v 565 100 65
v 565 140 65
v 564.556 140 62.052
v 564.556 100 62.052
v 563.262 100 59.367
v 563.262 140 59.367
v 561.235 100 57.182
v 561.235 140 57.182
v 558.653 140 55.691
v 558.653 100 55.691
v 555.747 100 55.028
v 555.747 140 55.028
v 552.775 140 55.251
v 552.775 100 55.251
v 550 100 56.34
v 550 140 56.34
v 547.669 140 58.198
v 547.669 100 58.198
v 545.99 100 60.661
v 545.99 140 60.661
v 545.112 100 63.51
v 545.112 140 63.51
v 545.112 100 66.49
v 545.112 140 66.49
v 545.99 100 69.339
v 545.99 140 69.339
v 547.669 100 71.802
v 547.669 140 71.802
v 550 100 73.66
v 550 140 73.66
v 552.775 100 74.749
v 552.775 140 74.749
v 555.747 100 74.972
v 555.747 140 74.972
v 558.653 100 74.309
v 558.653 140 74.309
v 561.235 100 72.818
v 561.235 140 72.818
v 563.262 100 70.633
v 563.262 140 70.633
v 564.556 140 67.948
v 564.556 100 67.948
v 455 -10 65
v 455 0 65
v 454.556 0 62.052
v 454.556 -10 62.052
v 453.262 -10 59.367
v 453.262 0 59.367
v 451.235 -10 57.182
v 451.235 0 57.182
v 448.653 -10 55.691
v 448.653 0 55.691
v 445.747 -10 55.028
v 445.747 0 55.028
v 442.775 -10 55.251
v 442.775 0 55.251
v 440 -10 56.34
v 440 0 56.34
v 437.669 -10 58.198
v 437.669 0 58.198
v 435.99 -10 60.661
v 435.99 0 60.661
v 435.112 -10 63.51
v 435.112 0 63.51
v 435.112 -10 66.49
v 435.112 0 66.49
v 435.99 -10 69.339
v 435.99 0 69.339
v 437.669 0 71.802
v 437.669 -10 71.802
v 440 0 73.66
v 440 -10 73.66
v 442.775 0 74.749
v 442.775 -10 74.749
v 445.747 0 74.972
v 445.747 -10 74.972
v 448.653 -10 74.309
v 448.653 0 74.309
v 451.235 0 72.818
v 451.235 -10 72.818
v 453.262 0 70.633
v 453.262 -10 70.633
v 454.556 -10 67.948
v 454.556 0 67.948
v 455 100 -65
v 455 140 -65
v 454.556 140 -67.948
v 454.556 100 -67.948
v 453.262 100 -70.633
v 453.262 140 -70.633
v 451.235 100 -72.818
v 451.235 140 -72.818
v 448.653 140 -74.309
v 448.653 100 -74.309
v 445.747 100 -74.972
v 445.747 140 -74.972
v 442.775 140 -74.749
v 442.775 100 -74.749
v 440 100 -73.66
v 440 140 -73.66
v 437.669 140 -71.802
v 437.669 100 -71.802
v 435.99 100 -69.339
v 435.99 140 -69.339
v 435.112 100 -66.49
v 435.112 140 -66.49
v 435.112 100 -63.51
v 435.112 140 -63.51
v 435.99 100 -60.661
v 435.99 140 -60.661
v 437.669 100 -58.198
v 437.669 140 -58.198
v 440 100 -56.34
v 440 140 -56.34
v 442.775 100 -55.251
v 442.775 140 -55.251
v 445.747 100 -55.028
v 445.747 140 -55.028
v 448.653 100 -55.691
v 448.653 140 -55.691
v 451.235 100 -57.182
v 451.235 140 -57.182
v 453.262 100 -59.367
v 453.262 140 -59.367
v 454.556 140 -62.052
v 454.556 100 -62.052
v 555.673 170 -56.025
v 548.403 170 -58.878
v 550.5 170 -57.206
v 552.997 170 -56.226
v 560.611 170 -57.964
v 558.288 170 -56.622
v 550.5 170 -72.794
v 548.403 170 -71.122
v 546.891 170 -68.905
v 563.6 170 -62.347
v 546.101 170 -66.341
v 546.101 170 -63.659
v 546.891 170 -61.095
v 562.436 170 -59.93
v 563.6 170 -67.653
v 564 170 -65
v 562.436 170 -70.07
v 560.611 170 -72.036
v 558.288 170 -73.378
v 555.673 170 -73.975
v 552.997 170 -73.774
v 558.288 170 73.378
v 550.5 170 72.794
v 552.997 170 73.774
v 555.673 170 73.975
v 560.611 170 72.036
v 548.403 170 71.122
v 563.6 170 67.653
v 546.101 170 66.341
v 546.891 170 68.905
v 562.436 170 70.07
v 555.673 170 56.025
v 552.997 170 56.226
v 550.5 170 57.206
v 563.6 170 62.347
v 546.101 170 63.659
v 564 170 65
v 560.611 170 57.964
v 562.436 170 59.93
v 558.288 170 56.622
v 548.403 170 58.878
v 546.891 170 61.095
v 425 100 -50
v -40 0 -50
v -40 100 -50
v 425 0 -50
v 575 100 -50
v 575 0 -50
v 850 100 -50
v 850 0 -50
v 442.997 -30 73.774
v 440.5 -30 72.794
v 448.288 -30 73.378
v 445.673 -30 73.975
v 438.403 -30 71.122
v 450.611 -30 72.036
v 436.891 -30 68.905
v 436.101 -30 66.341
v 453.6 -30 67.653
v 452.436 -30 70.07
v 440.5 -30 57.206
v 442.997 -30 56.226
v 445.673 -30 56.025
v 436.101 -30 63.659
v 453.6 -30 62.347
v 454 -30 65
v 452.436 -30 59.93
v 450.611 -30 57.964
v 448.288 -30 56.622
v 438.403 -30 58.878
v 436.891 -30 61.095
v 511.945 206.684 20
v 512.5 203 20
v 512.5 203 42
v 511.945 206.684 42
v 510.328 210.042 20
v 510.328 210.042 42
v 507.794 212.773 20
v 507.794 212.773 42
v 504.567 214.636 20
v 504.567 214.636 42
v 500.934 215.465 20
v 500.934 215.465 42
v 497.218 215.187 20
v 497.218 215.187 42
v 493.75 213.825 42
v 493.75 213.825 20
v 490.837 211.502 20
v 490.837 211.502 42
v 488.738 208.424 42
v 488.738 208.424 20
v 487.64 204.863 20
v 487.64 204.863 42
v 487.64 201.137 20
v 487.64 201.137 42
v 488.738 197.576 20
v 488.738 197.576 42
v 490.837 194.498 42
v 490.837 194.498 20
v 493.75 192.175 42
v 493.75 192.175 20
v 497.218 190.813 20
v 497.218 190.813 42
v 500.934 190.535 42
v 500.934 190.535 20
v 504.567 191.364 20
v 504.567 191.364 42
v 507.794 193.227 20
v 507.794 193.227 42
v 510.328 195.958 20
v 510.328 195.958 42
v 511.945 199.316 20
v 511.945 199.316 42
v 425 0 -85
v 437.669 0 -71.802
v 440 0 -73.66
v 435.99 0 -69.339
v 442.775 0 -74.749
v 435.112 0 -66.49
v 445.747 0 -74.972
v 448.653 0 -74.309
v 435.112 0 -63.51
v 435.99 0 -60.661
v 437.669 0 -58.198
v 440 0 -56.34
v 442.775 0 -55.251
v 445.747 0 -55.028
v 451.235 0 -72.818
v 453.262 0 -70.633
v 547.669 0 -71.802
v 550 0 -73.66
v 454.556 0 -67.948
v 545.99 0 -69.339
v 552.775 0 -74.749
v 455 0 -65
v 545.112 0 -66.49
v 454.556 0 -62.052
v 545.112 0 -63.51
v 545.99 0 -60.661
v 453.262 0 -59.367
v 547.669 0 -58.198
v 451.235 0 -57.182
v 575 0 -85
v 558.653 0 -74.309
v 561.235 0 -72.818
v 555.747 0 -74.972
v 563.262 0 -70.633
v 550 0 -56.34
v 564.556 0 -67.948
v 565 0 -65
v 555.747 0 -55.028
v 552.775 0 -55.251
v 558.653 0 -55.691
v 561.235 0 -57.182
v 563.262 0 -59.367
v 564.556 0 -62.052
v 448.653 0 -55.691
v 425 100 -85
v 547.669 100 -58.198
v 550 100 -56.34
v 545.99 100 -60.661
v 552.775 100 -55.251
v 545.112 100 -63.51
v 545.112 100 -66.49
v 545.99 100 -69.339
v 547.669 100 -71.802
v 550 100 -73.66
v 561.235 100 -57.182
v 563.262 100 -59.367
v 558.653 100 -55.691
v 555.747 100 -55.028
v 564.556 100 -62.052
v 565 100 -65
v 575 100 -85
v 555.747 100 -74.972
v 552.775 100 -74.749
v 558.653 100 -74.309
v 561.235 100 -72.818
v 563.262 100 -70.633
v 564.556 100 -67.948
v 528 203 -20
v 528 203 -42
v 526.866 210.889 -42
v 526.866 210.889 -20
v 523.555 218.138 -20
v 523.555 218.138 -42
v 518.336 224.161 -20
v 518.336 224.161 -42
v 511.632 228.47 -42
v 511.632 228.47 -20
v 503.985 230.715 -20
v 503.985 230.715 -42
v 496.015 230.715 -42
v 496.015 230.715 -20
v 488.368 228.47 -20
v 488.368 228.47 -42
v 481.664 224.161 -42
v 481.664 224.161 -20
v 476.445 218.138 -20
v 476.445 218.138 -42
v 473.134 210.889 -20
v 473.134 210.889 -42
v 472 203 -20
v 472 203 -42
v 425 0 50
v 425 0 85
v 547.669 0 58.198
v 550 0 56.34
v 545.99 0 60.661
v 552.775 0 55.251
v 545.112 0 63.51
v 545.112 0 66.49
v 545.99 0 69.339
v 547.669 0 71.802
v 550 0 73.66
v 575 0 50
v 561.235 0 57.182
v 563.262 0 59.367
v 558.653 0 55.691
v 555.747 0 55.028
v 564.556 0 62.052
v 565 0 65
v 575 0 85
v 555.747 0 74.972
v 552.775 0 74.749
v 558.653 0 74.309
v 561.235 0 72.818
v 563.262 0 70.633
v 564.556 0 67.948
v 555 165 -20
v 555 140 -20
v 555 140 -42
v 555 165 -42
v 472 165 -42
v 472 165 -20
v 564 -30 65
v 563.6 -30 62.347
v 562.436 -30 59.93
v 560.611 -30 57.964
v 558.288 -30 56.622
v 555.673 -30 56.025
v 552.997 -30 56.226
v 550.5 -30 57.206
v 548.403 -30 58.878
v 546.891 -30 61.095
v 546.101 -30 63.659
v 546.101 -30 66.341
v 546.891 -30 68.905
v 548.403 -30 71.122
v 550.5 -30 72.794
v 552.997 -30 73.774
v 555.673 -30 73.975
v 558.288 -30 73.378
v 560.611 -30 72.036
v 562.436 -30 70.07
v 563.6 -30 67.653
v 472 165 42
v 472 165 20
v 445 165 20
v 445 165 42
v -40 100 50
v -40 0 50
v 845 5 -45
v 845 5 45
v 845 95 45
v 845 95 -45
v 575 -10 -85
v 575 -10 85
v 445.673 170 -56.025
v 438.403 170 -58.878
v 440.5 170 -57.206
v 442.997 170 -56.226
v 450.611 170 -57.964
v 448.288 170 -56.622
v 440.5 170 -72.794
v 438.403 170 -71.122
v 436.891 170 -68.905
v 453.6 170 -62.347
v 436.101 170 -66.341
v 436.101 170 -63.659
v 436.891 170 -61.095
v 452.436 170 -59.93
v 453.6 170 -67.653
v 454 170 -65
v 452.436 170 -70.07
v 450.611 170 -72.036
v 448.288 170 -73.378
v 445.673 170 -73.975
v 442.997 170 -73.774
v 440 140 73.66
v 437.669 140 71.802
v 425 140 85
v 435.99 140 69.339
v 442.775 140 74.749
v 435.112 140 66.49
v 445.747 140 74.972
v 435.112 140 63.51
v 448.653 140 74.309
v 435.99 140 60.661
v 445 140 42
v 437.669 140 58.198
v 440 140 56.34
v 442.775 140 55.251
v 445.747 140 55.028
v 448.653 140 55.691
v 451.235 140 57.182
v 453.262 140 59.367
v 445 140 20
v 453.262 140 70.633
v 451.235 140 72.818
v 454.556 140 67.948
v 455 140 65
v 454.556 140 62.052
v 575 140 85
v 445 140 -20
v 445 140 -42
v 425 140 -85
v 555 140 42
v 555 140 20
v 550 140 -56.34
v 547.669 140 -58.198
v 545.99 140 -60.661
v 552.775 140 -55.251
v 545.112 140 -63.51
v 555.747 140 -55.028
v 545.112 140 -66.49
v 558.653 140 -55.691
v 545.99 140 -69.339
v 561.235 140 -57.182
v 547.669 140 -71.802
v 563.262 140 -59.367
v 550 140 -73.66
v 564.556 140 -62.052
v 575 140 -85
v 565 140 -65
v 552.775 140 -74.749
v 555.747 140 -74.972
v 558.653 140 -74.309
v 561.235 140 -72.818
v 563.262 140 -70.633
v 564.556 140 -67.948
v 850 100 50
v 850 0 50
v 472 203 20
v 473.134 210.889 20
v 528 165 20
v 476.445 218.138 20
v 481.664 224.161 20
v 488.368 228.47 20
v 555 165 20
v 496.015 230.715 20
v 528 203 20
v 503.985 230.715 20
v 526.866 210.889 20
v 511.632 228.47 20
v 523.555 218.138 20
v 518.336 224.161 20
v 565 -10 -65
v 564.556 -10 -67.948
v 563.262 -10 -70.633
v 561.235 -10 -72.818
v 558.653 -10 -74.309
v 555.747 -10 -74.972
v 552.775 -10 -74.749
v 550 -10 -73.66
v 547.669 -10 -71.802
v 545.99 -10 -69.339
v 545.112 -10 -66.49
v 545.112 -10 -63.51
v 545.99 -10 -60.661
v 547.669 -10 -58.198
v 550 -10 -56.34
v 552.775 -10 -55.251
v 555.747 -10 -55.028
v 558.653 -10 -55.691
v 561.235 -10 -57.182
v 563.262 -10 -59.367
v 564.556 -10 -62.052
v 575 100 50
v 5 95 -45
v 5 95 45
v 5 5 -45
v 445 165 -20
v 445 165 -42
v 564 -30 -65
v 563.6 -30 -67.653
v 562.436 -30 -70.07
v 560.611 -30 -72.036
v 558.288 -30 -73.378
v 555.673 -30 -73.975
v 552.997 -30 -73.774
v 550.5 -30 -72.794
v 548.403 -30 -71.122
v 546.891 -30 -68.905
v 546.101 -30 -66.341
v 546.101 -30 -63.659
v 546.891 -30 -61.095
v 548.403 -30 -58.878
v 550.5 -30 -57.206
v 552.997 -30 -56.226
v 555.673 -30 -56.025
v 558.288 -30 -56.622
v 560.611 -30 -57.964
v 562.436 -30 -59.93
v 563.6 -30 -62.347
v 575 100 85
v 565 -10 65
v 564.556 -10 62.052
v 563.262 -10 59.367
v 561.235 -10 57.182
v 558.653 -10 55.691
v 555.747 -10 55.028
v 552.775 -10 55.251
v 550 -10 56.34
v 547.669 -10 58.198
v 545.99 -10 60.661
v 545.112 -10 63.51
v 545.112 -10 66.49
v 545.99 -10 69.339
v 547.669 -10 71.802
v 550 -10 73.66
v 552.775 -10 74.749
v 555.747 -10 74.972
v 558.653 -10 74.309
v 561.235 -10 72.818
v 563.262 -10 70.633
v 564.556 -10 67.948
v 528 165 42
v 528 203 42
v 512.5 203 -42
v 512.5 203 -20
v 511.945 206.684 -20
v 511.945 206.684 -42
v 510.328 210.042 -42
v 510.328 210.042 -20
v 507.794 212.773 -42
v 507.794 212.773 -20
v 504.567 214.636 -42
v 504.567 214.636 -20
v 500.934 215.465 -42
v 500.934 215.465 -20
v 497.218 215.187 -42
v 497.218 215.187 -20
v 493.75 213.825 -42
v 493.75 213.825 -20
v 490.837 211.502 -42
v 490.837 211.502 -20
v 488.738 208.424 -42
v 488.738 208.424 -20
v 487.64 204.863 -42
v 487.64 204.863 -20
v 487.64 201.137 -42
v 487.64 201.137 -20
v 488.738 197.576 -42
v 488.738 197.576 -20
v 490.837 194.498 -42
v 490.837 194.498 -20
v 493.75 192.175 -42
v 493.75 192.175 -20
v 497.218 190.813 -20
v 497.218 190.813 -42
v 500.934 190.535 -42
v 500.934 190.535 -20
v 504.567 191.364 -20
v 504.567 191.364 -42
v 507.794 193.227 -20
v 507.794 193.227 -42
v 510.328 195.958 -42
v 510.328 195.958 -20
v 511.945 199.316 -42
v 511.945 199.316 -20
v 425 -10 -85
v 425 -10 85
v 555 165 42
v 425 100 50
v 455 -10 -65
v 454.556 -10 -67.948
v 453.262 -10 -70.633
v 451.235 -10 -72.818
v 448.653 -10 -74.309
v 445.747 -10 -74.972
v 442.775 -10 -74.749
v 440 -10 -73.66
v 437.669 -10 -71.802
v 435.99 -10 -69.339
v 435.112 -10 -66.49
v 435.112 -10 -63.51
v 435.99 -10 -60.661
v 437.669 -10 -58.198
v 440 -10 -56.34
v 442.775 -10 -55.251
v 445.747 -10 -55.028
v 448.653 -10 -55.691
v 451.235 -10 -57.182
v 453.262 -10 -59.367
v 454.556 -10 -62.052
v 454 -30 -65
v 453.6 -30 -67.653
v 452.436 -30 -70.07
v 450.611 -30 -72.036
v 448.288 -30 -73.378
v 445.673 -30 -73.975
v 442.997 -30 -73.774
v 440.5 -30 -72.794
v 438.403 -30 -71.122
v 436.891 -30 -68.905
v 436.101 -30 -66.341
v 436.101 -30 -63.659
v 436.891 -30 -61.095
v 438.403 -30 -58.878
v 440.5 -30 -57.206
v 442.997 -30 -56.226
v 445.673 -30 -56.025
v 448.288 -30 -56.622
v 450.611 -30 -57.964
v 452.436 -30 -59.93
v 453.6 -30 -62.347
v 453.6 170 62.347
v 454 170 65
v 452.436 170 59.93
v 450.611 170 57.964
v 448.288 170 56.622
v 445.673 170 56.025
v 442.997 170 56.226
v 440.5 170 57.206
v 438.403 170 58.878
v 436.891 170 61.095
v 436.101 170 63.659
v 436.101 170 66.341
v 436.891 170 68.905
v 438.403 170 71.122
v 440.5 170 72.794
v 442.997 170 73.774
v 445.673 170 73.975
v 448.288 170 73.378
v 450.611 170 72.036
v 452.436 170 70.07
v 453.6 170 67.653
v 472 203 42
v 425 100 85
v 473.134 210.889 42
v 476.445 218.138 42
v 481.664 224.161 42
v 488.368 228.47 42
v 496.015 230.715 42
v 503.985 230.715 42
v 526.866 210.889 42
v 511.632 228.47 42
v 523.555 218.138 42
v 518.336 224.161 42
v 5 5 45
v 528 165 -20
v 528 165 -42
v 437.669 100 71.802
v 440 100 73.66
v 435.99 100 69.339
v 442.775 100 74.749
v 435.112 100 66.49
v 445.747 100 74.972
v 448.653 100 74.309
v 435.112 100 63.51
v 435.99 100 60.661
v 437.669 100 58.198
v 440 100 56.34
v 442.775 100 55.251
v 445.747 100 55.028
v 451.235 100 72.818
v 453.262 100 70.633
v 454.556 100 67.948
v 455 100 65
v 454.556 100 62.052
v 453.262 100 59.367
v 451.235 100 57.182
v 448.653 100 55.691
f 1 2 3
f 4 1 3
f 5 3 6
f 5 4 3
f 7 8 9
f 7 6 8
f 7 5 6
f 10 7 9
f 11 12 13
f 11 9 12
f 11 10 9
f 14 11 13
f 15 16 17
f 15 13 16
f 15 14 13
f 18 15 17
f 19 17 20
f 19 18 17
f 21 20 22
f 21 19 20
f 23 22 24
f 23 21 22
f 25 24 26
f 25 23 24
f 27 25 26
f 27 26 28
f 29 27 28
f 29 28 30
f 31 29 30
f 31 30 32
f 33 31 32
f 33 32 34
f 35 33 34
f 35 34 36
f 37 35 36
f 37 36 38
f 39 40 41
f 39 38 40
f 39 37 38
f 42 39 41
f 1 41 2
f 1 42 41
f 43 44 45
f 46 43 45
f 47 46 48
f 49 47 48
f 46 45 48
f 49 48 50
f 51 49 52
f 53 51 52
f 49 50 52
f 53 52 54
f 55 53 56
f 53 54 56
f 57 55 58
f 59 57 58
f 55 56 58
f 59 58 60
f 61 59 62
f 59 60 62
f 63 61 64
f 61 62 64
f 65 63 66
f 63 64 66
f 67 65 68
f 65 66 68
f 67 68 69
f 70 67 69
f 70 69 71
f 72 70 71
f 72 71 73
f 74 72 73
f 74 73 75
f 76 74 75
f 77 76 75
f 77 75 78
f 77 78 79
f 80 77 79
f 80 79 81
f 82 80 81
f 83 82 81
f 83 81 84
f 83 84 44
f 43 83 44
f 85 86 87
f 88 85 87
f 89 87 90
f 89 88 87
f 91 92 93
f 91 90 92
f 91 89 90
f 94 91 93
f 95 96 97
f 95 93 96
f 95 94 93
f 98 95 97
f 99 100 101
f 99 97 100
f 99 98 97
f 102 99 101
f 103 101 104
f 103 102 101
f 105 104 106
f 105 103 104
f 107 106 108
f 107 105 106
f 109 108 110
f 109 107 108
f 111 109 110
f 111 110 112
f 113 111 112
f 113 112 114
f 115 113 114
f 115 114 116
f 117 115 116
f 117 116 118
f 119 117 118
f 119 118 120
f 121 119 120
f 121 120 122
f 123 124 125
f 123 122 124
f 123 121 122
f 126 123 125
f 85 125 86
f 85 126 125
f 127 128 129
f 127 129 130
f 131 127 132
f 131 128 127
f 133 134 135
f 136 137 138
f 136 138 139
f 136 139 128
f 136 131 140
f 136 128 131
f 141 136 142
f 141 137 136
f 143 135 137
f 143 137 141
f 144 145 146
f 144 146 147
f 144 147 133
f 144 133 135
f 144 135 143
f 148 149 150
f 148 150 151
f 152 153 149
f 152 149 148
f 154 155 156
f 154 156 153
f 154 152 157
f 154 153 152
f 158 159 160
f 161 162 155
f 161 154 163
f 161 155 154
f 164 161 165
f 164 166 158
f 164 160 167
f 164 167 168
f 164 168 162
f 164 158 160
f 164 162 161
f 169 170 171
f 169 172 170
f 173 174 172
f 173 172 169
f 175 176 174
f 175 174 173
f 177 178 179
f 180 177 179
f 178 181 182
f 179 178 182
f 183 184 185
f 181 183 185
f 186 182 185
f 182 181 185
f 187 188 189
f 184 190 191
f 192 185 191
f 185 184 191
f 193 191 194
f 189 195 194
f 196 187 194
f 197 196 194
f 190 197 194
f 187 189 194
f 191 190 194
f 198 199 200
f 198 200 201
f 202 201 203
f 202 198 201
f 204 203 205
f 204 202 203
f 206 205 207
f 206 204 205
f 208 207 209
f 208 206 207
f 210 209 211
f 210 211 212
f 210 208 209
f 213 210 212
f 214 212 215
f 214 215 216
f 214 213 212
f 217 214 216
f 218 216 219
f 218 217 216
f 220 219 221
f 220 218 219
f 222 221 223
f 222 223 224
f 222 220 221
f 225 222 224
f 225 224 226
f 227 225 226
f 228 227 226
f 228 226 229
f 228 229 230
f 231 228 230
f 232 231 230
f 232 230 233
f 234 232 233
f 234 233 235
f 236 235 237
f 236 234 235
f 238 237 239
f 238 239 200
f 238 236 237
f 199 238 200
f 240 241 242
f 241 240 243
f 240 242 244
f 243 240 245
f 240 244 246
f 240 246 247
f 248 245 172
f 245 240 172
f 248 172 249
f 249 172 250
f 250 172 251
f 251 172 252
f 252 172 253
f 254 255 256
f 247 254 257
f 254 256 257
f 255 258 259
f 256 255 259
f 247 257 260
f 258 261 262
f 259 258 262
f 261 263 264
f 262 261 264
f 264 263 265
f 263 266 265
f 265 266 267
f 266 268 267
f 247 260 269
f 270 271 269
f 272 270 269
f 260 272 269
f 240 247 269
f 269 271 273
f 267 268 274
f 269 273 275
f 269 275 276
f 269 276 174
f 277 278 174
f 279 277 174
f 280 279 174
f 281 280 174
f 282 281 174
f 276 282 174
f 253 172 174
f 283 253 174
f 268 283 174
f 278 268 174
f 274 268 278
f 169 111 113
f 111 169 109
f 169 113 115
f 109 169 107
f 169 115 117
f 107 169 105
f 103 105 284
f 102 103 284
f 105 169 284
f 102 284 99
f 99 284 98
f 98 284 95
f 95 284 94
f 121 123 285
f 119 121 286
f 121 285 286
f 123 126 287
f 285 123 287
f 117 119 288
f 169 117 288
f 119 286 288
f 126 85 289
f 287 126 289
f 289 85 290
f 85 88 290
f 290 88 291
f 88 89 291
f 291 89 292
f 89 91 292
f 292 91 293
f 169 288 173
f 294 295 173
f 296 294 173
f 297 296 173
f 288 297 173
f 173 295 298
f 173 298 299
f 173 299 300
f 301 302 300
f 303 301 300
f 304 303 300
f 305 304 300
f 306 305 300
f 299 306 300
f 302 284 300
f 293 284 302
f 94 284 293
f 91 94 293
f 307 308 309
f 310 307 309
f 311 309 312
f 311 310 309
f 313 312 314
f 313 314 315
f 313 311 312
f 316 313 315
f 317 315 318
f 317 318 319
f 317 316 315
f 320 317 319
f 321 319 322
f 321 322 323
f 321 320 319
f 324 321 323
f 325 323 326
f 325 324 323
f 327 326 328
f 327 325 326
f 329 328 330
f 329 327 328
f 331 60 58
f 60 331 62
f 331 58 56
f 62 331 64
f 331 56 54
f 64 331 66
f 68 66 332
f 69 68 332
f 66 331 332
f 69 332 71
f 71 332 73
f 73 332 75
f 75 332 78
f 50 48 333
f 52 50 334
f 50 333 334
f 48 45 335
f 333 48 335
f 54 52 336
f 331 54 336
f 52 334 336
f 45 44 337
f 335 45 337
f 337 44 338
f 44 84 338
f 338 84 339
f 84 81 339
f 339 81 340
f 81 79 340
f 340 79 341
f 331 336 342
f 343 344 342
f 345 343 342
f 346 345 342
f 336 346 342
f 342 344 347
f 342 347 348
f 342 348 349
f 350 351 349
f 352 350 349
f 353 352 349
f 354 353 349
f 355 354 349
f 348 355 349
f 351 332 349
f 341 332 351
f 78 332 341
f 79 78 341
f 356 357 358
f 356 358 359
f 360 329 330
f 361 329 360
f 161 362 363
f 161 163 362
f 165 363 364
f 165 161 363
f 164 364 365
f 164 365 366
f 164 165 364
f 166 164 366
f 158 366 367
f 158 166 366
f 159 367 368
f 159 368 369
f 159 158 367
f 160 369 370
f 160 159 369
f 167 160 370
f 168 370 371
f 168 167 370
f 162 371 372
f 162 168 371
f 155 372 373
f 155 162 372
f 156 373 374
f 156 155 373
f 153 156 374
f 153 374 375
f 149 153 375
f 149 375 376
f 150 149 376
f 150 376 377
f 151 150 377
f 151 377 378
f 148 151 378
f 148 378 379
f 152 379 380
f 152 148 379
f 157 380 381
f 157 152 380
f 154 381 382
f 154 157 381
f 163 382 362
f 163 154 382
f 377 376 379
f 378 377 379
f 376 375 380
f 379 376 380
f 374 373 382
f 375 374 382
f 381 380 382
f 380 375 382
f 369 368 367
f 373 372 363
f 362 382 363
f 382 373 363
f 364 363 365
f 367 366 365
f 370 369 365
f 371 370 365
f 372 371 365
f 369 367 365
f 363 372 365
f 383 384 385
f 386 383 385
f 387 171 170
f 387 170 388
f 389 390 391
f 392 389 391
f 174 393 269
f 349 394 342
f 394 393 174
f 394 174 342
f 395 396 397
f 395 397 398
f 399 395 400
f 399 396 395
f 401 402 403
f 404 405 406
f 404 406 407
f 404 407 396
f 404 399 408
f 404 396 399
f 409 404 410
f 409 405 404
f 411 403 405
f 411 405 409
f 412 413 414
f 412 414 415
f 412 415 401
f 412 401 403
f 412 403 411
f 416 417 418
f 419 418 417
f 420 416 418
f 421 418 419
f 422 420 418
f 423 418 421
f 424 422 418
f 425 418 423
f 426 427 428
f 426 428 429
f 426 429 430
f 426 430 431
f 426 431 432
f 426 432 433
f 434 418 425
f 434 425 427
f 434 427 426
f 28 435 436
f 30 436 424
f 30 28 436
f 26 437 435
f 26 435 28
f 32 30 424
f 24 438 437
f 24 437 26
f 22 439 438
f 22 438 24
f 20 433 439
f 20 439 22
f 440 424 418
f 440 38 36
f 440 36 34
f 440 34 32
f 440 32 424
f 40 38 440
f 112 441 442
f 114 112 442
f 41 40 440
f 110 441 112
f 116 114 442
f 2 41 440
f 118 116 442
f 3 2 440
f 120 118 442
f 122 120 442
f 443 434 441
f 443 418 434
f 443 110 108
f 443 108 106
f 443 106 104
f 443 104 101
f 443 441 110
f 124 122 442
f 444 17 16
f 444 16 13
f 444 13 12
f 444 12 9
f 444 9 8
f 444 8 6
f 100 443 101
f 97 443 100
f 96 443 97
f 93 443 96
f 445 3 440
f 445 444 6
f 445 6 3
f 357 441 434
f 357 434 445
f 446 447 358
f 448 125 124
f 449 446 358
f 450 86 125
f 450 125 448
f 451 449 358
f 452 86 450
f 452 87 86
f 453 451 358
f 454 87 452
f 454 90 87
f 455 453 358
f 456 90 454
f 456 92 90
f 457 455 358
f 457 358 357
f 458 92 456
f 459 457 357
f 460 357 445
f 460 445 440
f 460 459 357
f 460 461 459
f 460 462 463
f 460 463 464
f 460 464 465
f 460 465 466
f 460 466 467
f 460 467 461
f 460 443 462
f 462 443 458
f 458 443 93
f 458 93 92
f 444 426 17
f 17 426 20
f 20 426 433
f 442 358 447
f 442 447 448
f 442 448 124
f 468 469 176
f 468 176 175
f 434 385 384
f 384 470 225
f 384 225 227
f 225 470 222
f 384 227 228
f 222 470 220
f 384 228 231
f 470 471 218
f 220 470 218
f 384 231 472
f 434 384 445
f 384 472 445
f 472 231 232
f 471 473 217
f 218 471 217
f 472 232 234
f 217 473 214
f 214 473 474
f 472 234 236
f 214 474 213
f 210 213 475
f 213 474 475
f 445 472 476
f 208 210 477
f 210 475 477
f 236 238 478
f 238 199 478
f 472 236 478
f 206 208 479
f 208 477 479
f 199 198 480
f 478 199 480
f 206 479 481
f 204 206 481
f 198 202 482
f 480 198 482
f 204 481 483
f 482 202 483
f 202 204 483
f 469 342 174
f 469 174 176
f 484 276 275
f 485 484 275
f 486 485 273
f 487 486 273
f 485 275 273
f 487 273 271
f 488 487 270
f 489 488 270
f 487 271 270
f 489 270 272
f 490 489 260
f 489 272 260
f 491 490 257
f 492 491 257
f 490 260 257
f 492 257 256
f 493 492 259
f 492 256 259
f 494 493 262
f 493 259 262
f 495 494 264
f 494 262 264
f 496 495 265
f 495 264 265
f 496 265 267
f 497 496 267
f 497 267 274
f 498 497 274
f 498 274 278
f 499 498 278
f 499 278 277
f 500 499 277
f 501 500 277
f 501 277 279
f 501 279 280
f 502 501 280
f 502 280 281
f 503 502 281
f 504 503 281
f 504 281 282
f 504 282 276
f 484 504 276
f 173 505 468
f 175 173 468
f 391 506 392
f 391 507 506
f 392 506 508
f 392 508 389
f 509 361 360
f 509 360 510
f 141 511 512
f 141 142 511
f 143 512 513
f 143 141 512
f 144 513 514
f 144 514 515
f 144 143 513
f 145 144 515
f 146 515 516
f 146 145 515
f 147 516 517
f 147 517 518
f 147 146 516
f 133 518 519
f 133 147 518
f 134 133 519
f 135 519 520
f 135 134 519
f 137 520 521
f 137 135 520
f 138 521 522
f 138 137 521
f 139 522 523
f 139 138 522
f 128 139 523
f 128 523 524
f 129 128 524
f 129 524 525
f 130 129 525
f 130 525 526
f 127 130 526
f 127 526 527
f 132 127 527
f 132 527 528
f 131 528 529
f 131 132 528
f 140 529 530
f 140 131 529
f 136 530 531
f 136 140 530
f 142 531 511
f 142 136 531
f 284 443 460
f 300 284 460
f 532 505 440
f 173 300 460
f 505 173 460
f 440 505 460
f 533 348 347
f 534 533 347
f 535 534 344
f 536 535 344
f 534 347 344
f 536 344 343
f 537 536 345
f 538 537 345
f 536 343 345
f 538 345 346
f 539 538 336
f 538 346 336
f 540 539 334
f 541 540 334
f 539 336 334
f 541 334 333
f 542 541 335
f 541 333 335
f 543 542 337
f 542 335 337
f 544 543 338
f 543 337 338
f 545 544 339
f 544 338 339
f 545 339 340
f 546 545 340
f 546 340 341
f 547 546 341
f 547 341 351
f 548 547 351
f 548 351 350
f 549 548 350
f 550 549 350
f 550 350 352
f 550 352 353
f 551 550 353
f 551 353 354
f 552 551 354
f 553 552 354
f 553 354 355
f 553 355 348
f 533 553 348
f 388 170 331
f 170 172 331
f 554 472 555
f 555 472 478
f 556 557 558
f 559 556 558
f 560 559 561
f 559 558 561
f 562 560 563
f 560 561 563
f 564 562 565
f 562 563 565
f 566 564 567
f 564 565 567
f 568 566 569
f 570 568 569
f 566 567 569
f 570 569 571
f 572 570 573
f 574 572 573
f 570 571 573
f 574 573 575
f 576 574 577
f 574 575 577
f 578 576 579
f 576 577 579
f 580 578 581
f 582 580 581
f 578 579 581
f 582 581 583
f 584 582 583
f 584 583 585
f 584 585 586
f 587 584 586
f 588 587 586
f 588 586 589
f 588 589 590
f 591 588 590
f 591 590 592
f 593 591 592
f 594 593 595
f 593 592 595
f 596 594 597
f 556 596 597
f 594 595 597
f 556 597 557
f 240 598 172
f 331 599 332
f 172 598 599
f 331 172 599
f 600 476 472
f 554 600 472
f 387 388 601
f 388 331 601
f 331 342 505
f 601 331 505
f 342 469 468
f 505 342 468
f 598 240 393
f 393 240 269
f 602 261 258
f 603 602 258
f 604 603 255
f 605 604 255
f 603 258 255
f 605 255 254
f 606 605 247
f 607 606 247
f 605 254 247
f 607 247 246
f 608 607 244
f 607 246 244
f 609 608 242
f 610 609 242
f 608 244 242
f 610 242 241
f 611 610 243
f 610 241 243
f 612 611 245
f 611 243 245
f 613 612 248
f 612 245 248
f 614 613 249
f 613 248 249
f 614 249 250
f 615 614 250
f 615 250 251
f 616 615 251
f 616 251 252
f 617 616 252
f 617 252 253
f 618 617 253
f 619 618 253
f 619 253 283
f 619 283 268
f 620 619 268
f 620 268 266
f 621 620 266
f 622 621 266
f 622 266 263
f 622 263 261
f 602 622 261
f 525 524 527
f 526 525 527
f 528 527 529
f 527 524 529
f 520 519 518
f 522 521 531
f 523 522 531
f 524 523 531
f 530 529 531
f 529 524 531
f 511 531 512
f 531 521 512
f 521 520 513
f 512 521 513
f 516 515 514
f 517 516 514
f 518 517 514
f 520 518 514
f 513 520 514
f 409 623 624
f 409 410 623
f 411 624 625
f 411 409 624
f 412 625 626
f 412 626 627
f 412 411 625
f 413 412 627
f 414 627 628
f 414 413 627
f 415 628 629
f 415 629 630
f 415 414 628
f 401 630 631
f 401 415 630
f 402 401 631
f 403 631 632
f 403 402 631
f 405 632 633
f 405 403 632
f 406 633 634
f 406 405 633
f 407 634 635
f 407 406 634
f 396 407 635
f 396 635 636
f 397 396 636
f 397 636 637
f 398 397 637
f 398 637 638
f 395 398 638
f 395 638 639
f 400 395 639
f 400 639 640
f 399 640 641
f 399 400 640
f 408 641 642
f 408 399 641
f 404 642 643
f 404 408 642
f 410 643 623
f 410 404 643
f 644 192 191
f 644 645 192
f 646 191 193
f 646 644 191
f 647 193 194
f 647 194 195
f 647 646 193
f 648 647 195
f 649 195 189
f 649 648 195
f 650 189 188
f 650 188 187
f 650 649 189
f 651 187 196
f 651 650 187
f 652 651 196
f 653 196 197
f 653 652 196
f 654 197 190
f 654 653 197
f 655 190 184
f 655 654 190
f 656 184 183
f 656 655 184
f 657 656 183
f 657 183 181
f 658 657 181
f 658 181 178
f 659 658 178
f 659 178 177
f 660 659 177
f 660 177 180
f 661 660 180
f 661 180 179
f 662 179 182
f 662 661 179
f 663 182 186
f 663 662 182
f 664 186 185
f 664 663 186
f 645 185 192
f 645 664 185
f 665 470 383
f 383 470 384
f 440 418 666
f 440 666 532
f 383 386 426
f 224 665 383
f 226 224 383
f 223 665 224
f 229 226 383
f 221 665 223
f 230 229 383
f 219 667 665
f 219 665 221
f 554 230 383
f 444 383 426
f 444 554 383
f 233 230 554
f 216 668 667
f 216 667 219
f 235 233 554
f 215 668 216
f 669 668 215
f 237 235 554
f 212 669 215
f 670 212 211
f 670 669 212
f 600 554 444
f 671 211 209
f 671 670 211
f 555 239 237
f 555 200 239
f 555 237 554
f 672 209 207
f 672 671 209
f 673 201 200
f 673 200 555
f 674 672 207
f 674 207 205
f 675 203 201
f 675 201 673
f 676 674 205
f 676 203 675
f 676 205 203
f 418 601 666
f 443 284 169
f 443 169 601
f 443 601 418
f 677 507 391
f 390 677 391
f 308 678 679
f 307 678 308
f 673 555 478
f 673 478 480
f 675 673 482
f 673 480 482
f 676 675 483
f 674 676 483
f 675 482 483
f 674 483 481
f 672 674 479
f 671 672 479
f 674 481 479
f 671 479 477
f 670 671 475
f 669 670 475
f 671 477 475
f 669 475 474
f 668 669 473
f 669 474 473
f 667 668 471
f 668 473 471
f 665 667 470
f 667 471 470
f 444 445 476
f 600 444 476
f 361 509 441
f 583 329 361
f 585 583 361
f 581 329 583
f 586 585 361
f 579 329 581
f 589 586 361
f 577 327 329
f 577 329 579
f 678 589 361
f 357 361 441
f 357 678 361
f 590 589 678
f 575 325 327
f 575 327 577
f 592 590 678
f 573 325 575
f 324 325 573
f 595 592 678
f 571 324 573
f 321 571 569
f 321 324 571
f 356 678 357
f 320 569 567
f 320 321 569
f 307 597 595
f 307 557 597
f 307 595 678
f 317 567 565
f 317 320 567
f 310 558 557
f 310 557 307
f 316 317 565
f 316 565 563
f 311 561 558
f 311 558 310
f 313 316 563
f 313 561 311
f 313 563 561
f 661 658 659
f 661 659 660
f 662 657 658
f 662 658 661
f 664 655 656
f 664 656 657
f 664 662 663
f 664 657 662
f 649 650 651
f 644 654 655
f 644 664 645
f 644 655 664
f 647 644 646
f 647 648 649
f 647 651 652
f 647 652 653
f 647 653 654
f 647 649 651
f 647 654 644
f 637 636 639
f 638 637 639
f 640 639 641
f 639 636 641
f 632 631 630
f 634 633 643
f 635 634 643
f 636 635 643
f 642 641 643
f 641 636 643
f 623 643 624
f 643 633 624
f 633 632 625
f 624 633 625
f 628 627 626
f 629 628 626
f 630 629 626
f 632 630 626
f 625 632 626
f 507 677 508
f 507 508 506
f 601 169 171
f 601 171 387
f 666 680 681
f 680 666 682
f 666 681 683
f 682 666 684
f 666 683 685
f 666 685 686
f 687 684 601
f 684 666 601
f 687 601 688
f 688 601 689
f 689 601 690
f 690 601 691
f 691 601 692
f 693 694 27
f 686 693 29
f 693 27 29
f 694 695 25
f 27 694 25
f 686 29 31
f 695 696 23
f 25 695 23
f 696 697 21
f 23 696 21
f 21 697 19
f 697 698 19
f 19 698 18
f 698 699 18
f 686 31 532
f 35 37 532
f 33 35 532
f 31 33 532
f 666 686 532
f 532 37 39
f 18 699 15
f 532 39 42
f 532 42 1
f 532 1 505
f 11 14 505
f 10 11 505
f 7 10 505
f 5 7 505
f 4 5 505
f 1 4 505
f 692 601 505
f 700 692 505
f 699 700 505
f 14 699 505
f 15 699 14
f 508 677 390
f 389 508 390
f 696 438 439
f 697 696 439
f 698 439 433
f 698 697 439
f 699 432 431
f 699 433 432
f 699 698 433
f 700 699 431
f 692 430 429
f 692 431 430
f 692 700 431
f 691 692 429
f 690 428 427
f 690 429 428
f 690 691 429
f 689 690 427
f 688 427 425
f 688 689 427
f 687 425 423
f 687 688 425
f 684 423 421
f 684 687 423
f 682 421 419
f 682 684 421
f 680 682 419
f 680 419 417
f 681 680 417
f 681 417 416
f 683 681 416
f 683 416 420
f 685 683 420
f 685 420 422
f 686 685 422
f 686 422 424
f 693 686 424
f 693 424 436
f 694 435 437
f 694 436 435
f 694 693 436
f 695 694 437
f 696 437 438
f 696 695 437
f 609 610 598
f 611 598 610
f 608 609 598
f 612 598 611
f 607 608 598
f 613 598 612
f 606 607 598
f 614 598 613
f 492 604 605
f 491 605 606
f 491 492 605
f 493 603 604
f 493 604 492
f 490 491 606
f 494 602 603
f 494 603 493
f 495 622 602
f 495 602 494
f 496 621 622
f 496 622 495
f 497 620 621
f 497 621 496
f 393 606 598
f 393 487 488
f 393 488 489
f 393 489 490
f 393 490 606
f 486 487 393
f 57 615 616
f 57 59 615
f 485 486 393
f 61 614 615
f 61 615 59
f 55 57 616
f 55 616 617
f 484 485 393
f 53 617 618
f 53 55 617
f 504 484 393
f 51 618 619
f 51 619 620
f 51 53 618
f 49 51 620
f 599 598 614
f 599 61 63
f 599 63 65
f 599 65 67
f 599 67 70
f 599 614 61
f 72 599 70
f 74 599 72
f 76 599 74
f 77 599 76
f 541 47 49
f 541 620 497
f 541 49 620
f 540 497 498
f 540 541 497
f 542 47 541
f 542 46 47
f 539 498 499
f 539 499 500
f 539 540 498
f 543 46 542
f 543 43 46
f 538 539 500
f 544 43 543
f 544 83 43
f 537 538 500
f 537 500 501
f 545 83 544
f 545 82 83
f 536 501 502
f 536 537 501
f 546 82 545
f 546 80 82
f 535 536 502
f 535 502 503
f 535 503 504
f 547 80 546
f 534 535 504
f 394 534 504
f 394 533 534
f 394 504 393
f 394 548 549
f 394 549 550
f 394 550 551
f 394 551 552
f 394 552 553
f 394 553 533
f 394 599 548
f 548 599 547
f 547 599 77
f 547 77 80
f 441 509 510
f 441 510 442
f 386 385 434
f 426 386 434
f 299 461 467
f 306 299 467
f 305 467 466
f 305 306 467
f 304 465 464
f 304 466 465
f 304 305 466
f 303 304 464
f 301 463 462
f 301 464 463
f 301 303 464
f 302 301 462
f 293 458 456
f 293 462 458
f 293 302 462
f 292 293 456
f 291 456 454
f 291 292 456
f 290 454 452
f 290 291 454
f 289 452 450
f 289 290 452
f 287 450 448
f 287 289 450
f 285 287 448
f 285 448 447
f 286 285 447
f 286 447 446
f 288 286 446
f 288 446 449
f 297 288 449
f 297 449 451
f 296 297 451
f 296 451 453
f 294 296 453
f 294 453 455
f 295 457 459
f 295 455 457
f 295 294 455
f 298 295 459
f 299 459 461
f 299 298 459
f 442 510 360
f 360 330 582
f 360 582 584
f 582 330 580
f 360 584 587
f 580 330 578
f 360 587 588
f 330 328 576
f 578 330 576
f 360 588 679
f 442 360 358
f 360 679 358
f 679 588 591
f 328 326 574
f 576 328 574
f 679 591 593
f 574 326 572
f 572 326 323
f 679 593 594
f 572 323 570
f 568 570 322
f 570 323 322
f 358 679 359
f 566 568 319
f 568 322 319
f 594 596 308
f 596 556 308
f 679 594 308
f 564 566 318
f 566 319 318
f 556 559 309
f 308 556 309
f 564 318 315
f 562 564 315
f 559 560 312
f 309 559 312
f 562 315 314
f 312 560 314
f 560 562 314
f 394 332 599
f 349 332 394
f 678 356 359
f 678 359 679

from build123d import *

# Parameters (mm, degrees)
SKETCH2_W                   = 850
SKETCH2_H                   = 100
BOSS_EXTRUDE1_DEPTH         = 50
SKETCH7_W                   = 840
SKETCH7_H                   = 90
CUT_EXTRUDE2_DEPTH          = 45
SKETCH12_W                  = 150
SKETCH12_H                  = 40
SKETCH12_H_2                = 10
BOSS_EXTRUDE9_DEPTH         = 85
SKETCH5_W                   = 100
SKETCH5_H                   = 100
BOSS_EXTRUDE4_DEPTH         = 40
SKETCH13_R                  = 10
CUT_EXTRUDE3_DEPTH          = 141
CUT_EXTRUDE3_DEPTH_BACK     = 11
SKETCH14_R                  = 9
BOSS_EXTRUDE10_DEPTH        = 170
BOSS_EXTRUDE10_DEPTH_BACK   = 30
BOSS_EXTRUDE10_2_DEPTH      = 170
BOSS_EXTRUDE10_2_DEPTH_BACK = 30
BOSS_EXTRUDE10_3_DEPTH      = 170
BOSS_EXTRUDE10_3_DEPTH_BACK = 30
BOSS_EXTRUDE10_4_DEPTH      = 170
BOSS_EXTRUDE10_4_DEPTH_BACK = 30
SKETCH15_R                  = 12.5
BOSS_EXTRUDE11_DEPTH        = 22


with BuildPart() as part:
    # Sketch2 → Boss-Extrude1 (new body, symmetric)
    with BuildSketch(Plane.XY):
        with Locations((425, 50)):
            Rectangle(SKETCH2_W, SKETCH2_H)
    extrude(amount=BOSS_EXTRUDE1_DEPTH, both=True)

    # Sketch7 → Cut-Extrude2 (cut, symmetric)
    with BuildSketch(Plane.XY):
        with Locations((425, 50)):
            Rectangle(SKETCH7_W, SKETCH7_H)
    extrude(amount=CUT_EXTRUDE2_DEPTH, both=True, mode=Mode.SUBTRACT)

    # Sketch12 → Boss-Extrude9 (add, symmetric)
    with BuildSketch(Plane.XY):
        with Locations((500, 120)):
            Rectangle(SKETCH12_W, SKETCH12_H)
        with Locations((500, -5)):
            Rectangle(SKETCH12_W, SKETCH12_H_2)
    extrude(amount=BOSS_EXTRUDE9_DEPTH, both=True)

    # Sketch5 → Boss-Extrude4 (add)
    with BuildSketch(Plane.ZY):
        with Locations((0, 50)):
            Rectangle(SKETCH5_W, SKETCH5_H)
    extrude(amount=BOSS_EXTRUDE4_DEPTH)

    # Sketch13 → Cut-Extrude3 (cut, two sides)
    with BuildSketch(Plane(origin=(0, 0, 0), x_dir=(1, 0, 0), z_dir=(0, 1, 0))) as cut_extrude3_sk:
        with Locations((555, 65)):
            Circle(SKETCH13_R)
        with Locations((445, 65)):
            Circle(SKETCH13_R)
        with Locations((445, -65)):
            Circle(SKETCH13_R)
        with Locations((555, -65)):
            Circle(SKETCH13_R)
    extrude(amount=CUT_EXTRUDE3_DEPTH, mode=Mode.SUBTRACT)
    extrude(cut_extrude3_sk.sketch, amount=-CUT_EXTRUDE3_DEPTH_BACK, mode=Mode.SUBTRACT)

    # Sketch15 → Boss-Extrude11 (add)
    with BuildSketch(Plane.XY.offset(20)):
        with BuildLine():
            Line((555, 140), (555, 165))
            Line((555, 165), (528, 165))
            Line((528, 165), (528, 203))
            ThreePointArc((528, 203), (500, 231), (472, 203))
            Line((472, 203), (472, 165))
            Line((472, 165), (445, 165))
            Line((445, 165), (445, 140))
            Line((445, 140), (555, 140))
        make_face()
        with Locations((500, 203)):
            Circle(SKETCH15_R, mode=Mode.SUBTRACT)
    boss_extrude11 = extrude(amount=BOSS_EXTRUDE11_DEPTH)

    # Mirror2: Boss-Extrude11 across plane
    add(boss_extrude11.mirror(Plane.XY))


with BuildPart() as body_2:
    # Sketch14 → Boss-Extrude10 (new body, two sides)
    with BuildSketch(Plane(origin=(0, 0, 0), x_dir=(1, 0, 0), z_dir=(0, 1, 0))) as boss_extrude10_sk:
        with Locations((555, 65)):
            Circle(SKETCH14_R)
    extrude(amount=BOSS_EXTRUDE10_DEPTH)
    extrude(boss_extrude10_sk.sketch, amount=-BOSS_EXTRUDE10_DEPTH_BACK)


with BuildPart() as body_3:
    # Sketch14 → Boss-Extrude10 2 (new body, two sides)
    with BuildSketch(Plane(origin=(0, 0, 0), x_dir=(1, 0, 0), z_dir=(0, 1, 0))) as boss_extrude10_2_sk:
        with Locations((445, 65)):
            Circle(SKETCH14_R)
    extrude(amount=BOSS_EXTRUDE10_2_DEPTH)
    extrude(boss_extrude10_2_sk.sketch, amount=-BOSS_EXTRUDE10_2_DEPTH_BACK)


with BuildPart() as body_4:
    # Sketch14 → Boss-Extrude10 3 (new body, two sides)
    with BuildSketch(Plane(origin=(0, 0, 0), x_dir=(1, 0, 0), z_dir=(0, 1, 0))) as boss_extrude10_3_sk:
        with Locations((445, -65)):
            Circle(SKETCH14_R)
    extrude(amount=BOSS_EXTRUDE10_3_DEPTH)
    extrude(boss_extrude10_3_sk.sketch, amount=-BOSS_EXTRUDE10_3_DEPTH_BACK)


with BuildPart() as body_5:
    # Sketch14 → Boss-Extrude10 4 (new body, two sides)
    with BuildSketch(Plane(origin=(0, 0, 0), x_dir=(1, 0, 0), z_dir=(0, 1, 0))) as boss_extrude10_4_sk:
        with Locations((555, -65)):
            Circle(SKETCH14_R)
    extrude(amount=BOSS_EXTRUDE10_4_DEPTH)
    extrude(boss_extrude10_4_sk.sketch, amount=-BOSS_EXTRUDE10_4_DEPTH_BACK)


solid = Compound([part.part, body_2.part, body_3.part, body_4.part, body_5.part])
